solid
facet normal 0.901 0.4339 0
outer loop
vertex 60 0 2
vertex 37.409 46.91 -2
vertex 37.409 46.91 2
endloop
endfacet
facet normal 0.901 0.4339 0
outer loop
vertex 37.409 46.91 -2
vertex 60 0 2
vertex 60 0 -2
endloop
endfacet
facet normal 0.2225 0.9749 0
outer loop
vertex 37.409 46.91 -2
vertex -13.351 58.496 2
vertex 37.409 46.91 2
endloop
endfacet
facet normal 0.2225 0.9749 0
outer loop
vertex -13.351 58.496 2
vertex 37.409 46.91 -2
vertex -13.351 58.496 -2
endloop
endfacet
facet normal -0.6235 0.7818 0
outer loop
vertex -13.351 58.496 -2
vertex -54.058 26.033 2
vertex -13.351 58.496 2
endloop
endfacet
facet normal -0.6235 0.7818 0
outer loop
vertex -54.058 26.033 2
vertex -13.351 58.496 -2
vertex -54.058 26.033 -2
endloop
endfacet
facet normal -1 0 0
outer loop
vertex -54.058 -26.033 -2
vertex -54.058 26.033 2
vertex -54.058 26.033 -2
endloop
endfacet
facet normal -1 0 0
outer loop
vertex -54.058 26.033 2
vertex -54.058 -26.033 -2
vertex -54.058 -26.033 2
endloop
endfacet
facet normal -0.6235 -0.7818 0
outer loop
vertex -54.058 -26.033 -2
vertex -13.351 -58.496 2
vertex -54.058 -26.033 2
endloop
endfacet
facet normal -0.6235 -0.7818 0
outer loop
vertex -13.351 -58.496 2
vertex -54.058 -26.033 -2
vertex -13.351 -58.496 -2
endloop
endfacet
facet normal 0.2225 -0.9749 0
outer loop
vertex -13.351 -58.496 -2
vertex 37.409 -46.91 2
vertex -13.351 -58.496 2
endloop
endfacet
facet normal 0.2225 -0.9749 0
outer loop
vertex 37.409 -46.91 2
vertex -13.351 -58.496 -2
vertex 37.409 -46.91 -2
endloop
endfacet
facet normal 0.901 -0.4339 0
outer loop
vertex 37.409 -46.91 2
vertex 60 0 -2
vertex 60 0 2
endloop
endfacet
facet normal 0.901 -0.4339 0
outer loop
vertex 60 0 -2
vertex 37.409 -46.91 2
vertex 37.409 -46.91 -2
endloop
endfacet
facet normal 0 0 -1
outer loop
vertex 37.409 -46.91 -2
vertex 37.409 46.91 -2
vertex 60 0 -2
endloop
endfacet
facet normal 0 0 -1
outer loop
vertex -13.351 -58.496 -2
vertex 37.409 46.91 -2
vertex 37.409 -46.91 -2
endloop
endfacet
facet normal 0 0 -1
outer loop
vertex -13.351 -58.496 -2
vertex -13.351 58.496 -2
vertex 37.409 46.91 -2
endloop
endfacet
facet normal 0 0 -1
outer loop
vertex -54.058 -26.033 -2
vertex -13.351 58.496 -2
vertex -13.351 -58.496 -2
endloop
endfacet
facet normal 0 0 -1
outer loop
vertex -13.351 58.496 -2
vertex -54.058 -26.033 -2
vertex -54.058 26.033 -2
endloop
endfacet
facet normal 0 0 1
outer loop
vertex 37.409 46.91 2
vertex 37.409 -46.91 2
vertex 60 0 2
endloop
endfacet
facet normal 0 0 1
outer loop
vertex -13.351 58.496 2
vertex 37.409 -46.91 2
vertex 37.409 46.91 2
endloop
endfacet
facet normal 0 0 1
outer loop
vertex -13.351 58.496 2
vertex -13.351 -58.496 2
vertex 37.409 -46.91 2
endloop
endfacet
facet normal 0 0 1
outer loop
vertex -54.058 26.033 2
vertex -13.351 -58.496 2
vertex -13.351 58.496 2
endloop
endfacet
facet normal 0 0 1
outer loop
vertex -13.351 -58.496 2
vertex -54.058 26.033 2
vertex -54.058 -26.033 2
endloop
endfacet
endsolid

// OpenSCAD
module example001()
{
	cylinder(h = 4, r1 = 60, r2 = 60, center = true, $fs=60);
}

example001();
